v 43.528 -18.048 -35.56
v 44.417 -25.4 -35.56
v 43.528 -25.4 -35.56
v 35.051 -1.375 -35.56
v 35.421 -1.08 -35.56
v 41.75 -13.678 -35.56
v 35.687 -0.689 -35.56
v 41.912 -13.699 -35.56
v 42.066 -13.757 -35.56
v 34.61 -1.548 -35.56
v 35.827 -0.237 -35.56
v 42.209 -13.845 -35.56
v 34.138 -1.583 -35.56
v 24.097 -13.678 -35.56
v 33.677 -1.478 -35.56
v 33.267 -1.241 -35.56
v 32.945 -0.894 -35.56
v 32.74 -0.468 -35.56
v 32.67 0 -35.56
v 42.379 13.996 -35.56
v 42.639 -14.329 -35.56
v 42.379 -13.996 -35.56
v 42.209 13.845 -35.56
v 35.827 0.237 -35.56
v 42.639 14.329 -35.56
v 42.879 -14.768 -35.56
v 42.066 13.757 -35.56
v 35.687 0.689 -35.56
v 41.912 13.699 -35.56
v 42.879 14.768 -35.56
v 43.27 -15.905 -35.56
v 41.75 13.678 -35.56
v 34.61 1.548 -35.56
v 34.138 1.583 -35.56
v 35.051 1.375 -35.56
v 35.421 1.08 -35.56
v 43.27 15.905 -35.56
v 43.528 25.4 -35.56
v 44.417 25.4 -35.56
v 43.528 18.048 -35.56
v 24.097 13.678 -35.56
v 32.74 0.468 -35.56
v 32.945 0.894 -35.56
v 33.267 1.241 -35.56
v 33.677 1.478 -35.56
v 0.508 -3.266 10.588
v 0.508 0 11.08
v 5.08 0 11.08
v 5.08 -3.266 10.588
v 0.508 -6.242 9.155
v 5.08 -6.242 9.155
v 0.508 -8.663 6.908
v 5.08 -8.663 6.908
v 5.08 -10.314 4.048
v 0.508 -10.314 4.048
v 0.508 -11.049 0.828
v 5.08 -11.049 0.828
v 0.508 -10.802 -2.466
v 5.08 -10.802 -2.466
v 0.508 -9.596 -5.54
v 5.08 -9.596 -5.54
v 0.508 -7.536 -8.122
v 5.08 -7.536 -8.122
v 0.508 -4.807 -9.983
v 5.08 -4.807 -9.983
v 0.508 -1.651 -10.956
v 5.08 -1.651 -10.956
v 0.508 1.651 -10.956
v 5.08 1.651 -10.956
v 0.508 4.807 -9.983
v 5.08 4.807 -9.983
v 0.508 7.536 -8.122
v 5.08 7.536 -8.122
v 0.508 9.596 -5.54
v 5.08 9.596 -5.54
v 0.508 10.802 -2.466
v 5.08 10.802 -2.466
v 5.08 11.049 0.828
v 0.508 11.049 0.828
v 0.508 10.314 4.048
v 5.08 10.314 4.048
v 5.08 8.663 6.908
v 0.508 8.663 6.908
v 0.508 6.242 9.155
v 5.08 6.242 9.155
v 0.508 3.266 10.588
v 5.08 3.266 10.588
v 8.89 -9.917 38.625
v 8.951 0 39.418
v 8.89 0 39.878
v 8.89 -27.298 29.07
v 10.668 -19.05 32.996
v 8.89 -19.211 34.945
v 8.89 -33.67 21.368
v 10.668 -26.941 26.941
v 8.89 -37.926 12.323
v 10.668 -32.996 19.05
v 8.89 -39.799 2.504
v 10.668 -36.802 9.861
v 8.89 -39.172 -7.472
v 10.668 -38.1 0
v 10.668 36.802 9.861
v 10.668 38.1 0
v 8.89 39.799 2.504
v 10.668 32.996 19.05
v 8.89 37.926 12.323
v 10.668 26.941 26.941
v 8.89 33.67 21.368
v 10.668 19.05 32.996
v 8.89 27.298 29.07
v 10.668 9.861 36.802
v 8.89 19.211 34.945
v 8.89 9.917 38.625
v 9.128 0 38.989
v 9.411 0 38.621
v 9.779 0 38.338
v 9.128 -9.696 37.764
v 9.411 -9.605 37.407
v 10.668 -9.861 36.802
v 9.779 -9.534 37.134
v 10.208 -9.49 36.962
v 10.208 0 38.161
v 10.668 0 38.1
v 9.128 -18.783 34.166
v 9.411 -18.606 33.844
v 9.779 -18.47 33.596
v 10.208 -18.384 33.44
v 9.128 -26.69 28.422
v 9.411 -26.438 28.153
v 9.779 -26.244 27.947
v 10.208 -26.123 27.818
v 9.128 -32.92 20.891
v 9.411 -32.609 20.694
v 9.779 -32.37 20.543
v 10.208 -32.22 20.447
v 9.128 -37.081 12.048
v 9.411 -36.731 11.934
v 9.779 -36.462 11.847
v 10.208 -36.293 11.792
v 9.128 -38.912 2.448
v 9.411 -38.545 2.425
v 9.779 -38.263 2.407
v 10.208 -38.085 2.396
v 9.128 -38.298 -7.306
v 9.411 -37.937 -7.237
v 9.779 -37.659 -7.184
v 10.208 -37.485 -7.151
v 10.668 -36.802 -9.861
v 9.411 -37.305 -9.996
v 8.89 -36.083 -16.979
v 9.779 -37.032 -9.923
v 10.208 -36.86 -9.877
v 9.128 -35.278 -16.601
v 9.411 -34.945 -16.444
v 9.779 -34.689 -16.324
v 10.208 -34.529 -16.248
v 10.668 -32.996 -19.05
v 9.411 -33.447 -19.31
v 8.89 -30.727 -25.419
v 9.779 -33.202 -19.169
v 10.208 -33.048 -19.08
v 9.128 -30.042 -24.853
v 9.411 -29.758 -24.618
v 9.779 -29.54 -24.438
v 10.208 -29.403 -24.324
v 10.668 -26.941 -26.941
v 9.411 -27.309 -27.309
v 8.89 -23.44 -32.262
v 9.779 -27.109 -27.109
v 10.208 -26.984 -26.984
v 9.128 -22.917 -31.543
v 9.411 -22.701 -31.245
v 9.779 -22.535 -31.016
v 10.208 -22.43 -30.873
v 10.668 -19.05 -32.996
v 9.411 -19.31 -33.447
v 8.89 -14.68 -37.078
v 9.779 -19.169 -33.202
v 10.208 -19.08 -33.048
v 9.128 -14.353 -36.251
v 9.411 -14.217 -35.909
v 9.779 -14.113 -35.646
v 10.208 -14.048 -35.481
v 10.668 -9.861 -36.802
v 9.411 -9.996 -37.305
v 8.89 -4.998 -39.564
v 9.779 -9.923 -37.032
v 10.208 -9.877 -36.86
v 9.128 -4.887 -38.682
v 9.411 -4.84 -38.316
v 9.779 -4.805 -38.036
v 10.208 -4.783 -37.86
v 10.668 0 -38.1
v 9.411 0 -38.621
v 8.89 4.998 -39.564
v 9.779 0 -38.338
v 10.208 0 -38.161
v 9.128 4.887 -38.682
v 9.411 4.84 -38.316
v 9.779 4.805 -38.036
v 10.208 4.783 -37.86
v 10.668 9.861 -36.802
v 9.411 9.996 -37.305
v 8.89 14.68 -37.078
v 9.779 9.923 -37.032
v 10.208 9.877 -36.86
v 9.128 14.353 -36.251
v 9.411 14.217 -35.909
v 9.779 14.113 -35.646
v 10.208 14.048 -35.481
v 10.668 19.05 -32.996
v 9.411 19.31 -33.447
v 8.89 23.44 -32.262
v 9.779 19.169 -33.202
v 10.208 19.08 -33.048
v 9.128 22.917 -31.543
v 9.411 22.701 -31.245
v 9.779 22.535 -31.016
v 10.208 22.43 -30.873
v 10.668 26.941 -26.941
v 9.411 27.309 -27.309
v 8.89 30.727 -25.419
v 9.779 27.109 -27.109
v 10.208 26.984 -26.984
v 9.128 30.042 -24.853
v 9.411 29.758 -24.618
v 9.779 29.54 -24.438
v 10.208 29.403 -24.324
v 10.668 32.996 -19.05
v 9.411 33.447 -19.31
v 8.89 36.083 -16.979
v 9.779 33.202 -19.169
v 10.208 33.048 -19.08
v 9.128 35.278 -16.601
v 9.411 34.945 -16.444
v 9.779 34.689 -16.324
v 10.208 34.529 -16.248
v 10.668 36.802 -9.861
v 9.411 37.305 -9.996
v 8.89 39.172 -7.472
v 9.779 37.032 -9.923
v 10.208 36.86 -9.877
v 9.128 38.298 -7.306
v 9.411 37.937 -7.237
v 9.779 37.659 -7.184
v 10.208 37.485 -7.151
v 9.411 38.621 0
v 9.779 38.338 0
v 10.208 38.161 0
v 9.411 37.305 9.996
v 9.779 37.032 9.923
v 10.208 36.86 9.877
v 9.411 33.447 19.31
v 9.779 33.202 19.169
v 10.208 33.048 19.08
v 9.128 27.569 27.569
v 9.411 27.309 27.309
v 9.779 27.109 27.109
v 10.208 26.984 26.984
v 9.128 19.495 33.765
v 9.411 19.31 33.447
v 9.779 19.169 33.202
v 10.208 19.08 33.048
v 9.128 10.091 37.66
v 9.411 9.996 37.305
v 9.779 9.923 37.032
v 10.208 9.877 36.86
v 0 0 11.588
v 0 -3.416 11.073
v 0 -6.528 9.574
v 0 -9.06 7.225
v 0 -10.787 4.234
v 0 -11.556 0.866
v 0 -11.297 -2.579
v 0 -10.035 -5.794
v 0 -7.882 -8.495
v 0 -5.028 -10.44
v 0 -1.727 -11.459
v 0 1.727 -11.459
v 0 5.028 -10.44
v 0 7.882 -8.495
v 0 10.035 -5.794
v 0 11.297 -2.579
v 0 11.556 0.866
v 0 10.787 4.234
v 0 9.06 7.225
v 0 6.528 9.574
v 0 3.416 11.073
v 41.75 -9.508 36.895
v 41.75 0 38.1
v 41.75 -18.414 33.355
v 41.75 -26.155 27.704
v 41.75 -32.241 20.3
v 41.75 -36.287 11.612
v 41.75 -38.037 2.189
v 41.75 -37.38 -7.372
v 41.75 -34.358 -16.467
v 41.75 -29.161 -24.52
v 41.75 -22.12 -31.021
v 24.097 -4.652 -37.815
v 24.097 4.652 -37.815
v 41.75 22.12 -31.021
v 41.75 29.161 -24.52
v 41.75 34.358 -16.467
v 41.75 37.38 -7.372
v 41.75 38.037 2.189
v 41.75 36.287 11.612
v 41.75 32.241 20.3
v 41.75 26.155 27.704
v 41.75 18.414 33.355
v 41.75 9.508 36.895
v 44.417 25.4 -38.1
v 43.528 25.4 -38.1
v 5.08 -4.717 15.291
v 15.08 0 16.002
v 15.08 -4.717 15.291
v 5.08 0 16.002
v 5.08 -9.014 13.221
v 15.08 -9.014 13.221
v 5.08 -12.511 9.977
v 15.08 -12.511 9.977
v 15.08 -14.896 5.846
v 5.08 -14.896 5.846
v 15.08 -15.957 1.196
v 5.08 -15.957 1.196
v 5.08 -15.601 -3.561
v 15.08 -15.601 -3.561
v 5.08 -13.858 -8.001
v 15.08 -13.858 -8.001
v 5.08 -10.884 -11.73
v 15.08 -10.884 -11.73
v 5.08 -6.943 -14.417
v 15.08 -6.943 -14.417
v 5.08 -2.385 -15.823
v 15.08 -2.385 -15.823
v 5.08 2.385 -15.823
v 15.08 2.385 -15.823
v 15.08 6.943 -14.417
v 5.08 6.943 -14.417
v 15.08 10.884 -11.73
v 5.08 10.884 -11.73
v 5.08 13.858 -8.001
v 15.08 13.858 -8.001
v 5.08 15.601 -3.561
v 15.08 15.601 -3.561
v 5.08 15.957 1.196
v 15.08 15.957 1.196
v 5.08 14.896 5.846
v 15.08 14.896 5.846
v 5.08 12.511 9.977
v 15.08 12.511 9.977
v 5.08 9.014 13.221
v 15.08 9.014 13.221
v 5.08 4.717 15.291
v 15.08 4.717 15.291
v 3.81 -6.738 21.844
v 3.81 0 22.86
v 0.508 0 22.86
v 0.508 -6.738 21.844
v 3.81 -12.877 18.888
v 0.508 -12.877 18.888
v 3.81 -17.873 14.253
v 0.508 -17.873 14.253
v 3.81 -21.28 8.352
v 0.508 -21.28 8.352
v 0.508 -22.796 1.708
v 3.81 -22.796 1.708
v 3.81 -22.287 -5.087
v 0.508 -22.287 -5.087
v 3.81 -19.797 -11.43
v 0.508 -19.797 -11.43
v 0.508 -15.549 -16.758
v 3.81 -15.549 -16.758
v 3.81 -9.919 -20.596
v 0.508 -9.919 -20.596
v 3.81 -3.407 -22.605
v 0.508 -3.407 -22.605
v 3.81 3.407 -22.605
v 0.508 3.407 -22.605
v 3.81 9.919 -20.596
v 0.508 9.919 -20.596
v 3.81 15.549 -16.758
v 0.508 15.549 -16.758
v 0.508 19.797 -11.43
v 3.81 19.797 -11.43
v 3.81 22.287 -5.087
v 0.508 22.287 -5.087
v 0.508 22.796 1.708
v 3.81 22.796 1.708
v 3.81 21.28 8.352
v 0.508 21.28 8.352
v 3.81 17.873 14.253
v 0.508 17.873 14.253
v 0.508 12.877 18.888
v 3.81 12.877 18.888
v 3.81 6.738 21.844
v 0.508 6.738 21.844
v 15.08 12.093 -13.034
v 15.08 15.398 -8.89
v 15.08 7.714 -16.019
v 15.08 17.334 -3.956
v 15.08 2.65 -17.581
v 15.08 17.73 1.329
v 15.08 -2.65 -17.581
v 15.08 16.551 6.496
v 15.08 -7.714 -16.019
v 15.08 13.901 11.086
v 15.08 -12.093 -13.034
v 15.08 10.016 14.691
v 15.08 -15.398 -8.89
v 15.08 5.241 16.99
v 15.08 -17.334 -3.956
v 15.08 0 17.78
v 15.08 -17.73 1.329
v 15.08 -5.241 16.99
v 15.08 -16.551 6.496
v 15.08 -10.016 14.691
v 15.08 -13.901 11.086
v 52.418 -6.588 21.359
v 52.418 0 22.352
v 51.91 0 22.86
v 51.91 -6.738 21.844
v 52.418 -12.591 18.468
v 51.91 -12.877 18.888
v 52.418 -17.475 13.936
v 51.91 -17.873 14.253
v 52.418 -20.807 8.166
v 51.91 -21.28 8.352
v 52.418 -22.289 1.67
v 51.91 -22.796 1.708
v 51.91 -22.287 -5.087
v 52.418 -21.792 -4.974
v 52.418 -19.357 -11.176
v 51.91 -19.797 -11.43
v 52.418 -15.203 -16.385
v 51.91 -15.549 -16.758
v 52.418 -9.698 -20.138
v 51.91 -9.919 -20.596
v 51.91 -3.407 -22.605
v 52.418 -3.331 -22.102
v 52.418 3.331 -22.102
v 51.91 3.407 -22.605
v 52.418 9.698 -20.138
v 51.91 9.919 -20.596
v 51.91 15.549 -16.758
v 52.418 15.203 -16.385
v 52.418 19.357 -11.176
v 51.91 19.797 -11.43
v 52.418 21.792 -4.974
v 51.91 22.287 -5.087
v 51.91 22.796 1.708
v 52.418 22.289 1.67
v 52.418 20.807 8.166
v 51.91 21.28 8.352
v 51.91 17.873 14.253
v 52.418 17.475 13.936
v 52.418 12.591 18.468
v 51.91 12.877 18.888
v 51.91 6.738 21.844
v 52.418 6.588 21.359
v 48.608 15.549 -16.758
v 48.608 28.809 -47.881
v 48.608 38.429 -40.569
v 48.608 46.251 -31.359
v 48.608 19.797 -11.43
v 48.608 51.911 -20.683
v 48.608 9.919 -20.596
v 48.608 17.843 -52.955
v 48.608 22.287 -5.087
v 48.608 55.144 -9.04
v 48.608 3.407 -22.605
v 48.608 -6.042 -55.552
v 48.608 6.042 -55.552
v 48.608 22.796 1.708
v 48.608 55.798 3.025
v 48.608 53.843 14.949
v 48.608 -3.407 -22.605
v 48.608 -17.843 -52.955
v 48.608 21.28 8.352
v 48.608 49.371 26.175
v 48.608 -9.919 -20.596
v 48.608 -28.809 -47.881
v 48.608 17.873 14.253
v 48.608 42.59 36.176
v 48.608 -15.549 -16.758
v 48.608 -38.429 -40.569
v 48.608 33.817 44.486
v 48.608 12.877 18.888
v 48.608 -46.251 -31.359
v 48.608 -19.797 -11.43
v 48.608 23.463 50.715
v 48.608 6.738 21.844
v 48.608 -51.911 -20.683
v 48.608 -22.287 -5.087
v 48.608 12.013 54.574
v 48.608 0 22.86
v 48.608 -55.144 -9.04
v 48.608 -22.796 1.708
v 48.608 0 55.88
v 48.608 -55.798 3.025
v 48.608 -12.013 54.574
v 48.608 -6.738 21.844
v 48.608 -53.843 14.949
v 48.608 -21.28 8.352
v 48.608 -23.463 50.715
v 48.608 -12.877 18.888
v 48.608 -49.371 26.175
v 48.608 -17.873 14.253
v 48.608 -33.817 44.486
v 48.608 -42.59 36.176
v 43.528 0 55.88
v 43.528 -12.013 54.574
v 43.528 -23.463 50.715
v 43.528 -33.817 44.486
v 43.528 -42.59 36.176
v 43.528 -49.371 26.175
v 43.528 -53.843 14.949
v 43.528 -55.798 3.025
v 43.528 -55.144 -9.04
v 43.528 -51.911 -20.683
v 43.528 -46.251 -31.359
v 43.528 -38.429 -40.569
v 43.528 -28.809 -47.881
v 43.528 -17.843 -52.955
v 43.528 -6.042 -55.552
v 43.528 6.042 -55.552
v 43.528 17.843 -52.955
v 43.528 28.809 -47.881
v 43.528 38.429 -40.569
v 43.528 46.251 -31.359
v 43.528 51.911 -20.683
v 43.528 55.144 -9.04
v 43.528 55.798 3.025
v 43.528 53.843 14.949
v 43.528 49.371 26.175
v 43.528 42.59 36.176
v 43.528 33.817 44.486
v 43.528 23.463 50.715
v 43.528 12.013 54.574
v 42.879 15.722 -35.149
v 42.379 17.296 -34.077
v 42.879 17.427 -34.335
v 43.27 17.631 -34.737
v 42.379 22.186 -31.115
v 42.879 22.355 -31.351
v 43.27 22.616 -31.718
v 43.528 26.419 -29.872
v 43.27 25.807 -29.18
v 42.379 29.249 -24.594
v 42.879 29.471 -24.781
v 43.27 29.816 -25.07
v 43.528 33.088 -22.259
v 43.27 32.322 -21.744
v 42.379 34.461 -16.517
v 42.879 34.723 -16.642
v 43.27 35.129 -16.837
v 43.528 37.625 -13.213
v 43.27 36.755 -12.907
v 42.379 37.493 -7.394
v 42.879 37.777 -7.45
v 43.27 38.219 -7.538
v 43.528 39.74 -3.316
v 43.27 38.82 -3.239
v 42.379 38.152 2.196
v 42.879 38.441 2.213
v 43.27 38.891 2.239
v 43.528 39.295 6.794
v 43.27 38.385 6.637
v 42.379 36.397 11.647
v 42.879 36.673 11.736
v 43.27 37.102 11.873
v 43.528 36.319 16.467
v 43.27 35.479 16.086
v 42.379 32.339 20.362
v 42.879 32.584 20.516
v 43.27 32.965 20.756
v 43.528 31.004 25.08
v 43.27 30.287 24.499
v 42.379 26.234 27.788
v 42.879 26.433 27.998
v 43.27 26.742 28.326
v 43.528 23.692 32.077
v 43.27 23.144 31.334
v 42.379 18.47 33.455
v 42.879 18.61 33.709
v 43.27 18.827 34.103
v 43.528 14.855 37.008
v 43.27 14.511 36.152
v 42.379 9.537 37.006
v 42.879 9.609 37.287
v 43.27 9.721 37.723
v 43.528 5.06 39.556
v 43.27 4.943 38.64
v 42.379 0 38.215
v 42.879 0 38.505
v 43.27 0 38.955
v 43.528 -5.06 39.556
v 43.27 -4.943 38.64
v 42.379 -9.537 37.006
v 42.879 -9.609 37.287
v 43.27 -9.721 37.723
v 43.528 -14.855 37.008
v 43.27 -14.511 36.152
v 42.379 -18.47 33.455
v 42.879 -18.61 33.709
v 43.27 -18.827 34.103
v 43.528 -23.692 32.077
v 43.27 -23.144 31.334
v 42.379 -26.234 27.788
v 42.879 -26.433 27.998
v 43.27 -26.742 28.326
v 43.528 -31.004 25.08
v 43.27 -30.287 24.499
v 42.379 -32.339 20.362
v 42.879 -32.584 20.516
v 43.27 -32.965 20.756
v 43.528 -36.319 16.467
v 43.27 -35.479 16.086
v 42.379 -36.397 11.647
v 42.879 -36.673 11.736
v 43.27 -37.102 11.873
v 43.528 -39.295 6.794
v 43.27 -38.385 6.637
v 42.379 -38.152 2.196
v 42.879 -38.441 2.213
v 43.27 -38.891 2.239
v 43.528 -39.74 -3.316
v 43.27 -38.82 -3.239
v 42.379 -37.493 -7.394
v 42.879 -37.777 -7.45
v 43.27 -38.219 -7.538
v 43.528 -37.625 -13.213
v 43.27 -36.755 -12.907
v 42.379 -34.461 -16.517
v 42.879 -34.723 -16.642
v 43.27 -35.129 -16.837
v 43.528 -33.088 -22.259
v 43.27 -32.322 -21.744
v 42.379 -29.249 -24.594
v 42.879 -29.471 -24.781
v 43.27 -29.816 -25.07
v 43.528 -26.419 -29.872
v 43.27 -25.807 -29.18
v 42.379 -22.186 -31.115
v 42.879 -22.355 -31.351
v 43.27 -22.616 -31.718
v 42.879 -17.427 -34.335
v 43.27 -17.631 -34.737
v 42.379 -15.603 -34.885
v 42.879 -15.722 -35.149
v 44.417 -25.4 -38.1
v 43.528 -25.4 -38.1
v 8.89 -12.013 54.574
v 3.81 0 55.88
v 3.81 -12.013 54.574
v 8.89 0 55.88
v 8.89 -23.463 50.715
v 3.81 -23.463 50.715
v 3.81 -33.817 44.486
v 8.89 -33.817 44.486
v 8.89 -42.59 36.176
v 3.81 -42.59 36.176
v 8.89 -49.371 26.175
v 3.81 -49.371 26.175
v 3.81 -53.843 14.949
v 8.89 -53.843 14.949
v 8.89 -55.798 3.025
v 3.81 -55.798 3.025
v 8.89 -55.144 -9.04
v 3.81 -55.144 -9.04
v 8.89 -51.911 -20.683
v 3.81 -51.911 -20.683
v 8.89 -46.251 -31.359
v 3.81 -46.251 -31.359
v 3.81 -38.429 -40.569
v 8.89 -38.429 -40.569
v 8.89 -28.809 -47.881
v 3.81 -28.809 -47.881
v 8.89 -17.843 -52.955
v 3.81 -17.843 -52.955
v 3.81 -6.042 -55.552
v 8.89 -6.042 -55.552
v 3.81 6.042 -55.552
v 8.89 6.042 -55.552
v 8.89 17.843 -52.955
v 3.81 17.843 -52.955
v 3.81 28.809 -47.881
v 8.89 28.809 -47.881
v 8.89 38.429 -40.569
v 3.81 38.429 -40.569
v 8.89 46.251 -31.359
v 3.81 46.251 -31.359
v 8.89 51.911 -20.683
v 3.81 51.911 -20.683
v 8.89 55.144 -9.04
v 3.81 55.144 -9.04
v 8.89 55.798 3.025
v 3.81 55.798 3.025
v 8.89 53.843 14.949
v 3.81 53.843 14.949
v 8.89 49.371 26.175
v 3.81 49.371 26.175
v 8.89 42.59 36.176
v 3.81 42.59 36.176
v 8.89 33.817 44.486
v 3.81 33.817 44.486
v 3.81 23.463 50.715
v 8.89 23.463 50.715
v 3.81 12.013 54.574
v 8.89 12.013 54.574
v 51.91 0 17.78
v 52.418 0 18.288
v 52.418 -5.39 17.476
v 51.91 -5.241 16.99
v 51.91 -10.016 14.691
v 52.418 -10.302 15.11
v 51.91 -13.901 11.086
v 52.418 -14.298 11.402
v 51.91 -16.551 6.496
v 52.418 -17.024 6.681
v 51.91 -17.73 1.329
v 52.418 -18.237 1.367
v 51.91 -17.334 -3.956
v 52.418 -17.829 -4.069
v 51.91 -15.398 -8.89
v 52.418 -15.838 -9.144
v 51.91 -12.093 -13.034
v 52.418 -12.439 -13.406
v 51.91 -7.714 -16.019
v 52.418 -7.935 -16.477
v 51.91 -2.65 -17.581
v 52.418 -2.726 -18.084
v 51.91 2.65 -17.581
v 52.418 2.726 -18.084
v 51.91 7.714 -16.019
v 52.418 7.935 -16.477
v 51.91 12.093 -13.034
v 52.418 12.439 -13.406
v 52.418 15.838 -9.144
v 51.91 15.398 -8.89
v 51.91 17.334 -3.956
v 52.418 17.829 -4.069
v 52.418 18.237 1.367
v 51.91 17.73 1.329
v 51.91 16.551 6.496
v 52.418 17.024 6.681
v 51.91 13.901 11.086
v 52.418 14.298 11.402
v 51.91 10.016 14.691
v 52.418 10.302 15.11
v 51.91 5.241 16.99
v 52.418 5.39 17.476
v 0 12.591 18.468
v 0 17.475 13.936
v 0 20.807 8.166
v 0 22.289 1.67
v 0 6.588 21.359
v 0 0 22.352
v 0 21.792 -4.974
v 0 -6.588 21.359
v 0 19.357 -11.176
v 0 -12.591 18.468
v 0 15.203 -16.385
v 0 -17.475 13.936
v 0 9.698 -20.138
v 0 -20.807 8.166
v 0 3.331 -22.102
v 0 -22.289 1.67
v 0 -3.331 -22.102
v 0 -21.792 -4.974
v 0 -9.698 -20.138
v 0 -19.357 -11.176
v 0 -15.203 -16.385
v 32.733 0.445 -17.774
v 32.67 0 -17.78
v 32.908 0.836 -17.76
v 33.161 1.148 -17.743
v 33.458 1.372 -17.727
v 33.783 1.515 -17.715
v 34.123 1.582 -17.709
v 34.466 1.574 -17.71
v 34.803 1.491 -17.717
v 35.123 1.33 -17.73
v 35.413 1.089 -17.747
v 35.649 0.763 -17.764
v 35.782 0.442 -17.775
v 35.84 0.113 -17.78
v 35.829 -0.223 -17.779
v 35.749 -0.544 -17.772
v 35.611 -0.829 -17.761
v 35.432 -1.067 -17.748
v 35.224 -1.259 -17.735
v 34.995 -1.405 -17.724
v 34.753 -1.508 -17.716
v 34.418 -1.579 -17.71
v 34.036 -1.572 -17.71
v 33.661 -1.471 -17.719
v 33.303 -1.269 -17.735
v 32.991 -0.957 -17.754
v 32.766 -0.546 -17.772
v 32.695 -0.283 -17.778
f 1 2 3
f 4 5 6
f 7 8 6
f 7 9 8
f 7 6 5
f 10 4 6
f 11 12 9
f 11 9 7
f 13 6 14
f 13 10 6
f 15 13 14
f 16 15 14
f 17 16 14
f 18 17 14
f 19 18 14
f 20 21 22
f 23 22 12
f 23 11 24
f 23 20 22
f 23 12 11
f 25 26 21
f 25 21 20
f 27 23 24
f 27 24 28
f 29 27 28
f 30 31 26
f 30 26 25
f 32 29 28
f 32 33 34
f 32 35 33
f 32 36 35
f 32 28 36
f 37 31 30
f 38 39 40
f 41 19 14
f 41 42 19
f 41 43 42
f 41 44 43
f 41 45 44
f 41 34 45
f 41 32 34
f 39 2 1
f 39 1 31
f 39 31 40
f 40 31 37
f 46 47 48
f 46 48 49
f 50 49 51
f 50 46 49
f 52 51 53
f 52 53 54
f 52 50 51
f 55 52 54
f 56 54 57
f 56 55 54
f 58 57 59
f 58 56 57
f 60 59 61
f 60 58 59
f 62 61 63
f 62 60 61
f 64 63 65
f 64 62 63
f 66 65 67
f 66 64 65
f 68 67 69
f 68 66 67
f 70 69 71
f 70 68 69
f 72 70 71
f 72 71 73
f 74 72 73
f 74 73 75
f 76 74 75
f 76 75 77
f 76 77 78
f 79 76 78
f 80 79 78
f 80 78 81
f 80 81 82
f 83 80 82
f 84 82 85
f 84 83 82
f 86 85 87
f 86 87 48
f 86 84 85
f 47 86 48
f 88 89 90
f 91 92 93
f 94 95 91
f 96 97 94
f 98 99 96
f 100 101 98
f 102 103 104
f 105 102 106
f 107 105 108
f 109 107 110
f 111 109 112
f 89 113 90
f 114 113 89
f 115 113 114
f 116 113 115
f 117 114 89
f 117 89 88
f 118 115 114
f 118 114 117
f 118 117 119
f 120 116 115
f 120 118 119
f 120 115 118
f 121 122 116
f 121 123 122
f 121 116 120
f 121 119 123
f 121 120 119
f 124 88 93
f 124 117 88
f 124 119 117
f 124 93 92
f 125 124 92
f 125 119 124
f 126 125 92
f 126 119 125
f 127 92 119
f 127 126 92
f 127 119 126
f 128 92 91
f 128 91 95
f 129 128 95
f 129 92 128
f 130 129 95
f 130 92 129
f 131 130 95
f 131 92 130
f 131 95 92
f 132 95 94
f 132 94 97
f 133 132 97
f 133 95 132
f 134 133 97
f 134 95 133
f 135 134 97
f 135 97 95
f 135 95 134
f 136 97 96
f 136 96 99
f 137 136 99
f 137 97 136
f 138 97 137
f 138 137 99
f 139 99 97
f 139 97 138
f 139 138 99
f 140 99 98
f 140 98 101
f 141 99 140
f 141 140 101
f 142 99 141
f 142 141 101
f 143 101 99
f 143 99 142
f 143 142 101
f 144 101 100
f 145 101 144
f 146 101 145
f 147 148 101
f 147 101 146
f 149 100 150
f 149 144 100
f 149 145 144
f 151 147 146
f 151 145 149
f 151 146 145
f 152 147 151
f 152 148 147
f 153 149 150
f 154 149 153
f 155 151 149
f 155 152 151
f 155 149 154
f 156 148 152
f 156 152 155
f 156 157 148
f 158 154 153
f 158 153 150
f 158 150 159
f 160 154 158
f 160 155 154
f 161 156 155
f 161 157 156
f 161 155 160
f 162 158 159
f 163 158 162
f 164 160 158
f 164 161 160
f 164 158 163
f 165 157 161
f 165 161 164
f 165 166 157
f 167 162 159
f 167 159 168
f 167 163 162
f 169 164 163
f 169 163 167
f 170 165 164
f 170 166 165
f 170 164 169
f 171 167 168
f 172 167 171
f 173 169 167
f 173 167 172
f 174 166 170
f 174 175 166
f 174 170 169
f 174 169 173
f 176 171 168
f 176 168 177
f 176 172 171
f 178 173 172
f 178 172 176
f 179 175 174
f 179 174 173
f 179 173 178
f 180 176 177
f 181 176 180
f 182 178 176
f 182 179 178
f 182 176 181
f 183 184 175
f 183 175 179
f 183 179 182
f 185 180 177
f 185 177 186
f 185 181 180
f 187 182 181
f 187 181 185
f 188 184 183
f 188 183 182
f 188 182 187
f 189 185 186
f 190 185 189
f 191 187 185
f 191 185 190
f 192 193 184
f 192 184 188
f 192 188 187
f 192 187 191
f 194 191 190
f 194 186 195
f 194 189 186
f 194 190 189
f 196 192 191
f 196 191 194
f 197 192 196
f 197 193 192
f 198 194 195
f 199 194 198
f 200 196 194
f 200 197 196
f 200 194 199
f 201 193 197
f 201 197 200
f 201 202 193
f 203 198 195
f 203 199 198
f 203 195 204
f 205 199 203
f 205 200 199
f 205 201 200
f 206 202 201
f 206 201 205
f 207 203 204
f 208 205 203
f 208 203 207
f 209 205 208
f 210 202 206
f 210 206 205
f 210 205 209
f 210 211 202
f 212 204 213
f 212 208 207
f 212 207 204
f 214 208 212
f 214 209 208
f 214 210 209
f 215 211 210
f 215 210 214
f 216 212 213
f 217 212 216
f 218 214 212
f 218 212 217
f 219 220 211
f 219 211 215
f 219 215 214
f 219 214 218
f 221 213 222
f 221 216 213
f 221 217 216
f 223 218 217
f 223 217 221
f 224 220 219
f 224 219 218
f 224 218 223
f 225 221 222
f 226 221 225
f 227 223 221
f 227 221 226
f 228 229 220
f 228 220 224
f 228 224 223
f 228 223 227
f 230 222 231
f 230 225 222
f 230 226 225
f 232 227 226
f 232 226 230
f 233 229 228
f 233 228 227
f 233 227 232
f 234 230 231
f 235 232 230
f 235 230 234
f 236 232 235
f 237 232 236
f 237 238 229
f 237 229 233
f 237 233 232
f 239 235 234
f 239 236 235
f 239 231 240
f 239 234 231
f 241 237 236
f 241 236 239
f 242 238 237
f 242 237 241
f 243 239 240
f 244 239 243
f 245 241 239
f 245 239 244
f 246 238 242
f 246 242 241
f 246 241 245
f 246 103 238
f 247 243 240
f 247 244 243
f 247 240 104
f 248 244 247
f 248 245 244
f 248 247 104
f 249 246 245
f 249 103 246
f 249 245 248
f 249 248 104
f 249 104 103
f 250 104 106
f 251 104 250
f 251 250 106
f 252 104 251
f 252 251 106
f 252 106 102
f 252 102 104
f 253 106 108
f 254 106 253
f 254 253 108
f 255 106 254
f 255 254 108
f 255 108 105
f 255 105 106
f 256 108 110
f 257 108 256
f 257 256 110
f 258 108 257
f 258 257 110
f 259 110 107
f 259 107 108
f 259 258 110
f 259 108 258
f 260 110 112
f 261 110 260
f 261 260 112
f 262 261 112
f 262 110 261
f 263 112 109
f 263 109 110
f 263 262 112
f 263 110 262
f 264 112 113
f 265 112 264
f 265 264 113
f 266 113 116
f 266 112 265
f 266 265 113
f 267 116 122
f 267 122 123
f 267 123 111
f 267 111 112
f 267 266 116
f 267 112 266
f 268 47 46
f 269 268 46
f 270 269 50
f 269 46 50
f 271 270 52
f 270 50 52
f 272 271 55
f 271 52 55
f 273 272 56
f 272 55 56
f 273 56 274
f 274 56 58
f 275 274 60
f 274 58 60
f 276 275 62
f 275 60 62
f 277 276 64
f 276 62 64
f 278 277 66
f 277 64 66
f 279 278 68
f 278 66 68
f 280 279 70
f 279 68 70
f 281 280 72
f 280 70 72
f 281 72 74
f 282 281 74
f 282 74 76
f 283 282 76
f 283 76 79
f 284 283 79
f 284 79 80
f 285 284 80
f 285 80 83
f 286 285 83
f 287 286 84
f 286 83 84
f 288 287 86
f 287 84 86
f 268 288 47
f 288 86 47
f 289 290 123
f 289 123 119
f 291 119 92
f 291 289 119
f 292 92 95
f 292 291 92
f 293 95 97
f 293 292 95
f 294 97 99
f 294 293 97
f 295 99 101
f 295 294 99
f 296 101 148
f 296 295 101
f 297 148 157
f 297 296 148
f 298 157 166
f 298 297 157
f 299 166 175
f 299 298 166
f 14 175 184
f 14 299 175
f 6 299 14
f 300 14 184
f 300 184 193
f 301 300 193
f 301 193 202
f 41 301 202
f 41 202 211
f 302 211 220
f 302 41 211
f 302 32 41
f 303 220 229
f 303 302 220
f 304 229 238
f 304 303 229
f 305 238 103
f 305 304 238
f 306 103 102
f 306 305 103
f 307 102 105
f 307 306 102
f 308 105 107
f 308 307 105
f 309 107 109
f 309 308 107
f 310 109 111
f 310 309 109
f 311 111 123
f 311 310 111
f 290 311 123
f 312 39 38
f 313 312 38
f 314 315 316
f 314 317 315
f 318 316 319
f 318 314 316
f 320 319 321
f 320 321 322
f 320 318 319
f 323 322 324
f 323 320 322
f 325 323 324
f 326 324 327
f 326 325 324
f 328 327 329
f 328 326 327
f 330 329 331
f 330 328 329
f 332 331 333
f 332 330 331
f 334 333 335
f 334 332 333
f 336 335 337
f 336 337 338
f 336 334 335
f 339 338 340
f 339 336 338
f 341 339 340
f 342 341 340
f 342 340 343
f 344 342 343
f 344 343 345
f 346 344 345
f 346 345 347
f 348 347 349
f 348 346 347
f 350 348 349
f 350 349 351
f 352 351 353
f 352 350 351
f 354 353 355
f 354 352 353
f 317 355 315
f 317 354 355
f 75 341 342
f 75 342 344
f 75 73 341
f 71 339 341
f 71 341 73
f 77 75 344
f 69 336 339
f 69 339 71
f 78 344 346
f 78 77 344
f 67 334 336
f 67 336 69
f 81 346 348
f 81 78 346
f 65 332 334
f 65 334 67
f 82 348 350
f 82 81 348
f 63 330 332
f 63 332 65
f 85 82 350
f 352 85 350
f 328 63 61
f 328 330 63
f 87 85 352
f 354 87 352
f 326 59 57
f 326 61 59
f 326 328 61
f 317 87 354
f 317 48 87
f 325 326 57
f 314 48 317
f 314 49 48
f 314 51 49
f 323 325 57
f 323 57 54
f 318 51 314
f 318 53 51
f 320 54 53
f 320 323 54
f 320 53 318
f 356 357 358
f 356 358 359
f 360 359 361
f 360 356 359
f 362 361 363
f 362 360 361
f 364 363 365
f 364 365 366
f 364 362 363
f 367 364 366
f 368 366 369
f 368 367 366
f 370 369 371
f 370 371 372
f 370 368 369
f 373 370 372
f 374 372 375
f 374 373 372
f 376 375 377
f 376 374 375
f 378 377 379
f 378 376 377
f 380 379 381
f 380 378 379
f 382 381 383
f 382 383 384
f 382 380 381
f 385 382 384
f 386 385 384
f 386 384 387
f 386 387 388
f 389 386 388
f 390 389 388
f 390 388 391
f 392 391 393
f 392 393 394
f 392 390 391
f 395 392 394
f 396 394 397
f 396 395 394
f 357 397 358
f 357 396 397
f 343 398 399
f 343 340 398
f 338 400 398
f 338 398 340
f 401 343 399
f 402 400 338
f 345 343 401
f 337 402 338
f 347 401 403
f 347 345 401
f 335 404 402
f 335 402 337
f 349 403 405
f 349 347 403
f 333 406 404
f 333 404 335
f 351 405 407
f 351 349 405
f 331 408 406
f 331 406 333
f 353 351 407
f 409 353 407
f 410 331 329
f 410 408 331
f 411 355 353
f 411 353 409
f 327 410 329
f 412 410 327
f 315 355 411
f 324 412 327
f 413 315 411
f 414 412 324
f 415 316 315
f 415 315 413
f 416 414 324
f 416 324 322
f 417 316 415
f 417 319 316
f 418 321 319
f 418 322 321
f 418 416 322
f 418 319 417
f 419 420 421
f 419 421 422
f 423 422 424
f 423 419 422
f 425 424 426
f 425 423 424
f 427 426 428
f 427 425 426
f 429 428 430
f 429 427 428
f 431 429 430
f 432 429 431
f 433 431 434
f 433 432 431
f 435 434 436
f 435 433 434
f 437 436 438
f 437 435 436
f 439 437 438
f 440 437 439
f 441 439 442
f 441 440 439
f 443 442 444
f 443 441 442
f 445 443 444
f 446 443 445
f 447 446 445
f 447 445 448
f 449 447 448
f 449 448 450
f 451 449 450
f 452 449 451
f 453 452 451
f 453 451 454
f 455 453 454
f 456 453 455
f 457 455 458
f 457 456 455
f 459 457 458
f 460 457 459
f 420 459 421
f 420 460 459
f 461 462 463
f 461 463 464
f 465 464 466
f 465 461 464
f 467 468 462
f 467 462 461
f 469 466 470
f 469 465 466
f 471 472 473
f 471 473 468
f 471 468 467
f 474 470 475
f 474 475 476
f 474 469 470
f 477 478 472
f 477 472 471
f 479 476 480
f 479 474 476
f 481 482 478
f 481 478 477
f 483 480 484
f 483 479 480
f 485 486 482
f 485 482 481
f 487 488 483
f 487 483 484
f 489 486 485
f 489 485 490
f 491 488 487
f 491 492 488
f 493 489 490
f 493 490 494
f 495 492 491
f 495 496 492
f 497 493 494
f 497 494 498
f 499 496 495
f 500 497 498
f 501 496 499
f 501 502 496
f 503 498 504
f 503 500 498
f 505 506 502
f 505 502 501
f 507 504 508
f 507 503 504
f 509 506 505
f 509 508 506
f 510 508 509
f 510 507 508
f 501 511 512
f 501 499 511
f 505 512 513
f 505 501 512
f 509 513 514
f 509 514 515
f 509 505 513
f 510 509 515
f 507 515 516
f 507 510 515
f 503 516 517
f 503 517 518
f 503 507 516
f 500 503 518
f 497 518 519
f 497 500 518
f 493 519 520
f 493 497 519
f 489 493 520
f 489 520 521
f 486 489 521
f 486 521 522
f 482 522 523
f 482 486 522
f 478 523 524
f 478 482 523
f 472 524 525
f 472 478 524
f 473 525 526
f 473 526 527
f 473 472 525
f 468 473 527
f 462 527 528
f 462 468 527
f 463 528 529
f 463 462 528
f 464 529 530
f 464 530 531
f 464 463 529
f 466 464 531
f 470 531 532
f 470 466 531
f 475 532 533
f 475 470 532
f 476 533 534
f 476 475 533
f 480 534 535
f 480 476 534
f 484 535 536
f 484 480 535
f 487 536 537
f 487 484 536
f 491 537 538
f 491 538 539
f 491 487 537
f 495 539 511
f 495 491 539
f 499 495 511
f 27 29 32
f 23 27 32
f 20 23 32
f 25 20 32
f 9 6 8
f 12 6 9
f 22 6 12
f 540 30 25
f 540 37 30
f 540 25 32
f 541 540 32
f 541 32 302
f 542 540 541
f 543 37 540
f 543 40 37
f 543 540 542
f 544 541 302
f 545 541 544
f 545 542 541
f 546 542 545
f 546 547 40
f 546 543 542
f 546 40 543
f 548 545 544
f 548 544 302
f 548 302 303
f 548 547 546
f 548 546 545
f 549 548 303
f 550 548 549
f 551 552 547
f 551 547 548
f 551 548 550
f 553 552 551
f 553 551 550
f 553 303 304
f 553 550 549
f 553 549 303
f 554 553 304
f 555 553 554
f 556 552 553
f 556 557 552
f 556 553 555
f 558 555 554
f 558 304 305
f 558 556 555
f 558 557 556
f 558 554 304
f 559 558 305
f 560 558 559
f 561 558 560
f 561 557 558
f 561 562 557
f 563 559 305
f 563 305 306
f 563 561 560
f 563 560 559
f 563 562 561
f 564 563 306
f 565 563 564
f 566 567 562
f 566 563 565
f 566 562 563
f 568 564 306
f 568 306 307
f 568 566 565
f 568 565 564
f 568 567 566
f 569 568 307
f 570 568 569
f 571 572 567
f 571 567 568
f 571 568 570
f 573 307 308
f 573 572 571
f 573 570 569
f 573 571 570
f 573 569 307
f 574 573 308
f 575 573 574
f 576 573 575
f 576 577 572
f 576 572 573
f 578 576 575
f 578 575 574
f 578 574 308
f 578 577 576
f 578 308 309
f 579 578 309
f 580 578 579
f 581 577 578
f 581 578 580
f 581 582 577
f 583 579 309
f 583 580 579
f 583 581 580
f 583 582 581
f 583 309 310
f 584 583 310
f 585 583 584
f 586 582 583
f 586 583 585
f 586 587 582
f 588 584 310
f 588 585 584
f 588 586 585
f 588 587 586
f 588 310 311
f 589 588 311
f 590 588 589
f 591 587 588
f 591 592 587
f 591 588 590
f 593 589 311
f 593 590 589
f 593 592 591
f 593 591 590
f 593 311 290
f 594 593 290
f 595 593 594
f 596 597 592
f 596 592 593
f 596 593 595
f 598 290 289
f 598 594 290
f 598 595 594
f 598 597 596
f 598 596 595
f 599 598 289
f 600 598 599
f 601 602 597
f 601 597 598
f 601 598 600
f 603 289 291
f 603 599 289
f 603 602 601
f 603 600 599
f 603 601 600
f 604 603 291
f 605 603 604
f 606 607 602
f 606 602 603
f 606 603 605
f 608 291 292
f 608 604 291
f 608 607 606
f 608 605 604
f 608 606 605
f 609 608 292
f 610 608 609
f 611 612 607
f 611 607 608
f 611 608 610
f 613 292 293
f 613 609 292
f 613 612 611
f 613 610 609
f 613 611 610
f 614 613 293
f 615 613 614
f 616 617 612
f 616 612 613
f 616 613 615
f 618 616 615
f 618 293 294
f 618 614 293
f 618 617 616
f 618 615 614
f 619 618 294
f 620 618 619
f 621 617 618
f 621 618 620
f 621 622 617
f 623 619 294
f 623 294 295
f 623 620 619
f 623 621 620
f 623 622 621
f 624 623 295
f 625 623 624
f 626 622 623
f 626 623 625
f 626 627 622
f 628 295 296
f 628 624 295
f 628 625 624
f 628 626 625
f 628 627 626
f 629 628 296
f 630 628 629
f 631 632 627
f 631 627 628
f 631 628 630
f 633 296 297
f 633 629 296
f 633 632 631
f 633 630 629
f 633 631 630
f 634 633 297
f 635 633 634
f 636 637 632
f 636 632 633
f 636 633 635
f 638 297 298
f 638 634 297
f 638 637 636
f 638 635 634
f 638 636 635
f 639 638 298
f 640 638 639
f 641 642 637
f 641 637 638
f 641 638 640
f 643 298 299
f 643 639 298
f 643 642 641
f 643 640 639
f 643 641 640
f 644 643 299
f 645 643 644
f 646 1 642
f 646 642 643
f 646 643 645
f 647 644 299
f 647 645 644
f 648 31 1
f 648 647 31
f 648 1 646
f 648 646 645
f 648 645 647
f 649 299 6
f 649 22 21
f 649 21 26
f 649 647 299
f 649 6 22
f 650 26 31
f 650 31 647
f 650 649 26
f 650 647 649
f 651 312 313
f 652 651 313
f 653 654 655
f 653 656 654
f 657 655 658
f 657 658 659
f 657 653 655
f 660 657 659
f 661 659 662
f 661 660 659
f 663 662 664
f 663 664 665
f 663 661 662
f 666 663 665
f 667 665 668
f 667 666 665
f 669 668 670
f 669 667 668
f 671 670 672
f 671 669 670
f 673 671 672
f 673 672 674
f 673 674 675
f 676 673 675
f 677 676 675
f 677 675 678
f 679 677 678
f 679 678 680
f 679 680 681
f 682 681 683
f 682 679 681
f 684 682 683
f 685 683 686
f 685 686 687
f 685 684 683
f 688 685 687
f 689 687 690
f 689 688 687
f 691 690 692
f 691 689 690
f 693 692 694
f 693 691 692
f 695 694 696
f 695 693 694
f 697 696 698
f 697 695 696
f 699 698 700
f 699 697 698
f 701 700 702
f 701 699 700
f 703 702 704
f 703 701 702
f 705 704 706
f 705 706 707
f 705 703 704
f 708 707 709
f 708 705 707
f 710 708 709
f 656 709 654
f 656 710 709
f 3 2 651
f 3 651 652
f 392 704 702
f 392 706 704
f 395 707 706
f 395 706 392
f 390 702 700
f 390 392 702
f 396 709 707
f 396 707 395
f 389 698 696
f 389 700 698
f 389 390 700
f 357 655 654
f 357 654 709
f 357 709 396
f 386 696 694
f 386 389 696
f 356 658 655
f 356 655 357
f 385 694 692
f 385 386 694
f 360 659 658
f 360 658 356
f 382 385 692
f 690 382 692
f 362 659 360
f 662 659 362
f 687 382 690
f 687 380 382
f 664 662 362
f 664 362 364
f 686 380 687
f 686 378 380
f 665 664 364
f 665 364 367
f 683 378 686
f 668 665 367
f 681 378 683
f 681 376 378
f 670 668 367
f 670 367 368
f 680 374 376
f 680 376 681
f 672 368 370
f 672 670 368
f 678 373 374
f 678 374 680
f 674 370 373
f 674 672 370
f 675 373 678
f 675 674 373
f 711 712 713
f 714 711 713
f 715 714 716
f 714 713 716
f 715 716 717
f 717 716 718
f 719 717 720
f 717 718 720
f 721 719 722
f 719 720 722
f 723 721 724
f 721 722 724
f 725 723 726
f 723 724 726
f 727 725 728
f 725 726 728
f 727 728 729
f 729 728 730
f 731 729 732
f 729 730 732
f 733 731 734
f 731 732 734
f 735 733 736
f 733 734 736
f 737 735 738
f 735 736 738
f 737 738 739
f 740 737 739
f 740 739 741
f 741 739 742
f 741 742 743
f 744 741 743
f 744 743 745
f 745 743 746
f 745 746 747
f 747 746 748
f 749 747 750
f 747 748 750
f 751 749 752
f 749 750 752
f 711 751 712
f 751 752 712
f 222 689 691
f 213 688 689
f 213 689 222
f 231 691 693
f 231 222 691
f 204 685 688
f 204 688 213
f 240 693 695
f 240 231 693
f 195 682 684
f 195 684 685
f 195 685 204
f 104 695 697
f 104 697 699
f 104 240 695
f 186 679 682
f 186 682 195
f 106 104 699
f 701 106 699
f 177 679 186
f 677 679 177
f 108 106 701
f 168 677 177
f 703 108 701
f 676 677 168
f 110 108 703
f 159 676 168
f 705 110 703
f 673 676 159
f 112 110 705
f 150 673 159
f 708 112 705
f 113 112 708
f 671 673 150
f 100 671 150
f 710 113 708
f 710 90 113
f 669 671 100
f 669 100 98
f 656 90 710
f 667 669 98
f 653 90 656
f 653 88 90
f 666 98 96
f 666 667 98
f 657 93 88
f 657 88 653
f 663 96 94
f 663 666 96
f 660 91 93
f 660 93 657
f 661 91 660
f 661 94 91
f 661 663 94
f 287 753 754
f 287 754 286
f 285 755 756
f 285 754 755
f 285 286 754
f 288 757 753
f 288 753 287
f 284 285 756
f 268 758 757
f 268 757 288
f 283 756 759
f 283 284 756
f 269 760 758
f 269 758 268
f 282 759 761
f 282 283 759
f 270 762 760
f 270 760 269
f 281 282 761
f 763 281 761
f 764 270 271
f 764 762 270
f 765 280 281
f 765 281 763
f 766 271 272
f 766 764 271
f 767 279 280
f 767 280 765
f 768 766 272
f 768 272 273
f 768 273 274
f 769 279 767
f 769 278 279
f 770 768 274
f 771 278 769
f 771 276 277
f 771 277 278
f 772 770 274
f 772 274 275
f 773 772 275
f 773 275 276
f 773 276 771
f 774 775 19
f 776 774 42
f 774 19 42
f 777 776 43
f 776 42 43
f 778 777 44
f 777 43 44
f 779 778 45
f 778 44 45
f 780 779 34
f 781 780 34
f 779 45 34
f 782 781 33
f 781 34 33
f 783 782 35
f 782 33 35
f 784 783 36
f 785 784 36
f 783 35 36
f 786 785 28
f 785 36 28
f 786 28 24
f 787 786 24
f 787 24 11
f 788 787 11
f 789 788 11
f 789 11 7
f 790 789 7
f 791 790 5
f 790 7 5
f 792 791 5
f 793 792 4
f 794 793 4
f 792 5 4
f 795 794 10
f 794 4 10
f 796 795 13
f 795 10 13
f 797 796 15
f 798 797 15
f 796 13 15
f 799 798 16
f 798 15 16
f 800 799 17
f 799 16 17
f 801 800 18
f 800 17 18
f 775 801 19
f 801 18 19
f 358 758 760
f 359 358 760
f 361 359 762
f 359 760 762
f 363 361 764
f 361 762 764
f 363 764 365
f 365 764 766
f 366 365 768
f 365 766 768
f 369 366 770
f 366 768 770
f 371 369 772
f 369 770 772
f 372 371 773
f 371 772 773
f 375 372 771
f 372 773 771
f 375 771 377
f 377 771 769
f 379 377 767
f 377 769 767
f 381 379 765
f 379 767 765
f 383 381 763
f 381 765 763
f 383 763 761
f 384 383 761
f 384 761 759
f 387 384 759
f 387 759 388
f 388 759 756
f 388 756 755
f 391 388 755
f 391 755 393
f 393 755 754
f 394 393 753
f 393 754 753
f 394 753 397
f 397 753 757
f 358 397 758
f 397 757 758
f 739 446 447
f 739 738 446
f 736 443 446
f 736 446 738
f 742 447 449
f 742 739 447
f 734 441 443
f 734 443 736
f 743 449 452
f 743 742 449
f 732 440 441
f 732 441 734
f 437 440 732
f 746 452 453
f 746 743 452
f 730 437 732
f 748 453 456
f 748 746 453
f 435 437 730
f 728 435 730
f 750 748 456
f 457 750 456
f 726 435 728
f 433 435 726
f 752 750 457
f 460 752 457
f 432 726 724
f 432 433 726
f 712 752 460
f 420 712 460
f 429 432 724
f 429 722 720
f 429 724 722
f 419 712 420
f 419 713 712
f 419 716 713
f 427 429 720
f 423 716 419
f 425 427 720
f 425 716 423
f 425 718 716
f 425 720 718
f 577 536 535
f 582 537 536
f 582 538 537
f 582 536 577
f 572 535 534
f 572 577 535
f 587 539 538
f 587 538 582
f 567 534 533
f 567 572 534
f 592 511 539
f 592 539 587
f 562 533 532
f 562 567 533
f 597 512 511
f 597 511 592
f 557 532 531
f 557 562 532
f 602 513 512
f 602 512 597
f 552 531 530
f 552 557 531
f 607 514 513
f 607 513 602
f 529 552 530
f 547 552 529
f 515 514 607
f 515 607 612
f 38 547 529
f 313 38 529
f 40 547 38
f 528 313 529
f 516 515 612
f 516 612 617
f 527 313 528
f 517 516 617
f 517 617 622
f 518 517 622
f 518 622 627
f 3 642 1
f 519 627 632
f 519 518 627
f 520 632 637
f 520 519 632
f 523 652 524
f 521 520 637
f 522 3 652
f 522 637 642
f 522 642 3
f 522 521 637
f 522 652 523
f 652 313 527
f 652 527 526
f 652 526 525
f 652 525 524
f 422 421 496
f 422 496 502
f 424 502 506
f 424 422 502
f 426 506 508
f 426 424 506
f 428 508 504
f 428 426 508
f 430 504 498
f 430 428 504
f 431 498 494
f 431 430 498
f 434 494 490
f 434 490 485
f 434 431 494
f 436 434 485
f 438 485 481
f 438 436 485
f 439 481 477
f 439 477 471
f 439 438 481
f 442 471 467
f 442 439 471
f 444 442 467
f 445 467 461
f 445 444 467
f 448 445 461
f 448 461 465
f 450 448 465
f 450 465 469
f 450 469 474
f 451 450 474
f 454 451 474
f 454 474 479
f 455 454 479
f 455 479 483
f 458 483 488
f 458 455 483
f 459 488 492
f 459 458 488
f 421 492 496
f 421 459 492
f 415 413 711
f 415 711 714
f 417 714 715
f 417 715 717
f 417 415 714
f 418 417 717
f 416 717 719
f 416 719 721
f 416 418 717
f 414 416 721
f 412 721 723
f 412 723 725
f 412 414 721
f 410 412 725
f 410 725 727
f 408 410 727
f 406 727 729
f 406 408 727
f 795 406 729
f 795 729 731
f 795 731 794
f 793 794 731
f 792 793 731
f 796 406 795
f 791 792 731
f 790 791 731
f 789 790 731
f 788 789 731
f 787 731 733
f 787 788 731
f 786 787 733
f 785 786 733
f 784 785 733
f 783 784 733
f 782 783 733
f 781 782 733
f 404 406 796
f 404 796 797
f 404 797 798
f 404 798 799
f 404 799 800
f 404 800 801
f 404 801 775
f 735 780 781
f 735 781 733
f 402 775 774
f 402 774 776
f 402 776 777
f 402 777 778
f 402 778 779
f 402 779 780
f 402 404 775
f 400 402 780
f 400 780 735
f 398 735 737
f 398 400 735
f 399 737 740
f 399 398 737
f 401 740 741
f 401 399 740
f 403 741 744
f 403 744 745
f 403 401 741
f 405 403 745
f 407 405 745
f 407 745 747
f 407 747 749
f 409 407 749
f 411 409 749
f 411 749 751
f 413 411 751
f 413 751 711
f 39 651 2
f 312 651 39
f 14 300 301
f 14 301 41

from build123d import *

# Parameters (mm, degrees)
SKETCH3_W                         = 20.32
SKETCH3_H                         = 50.8
CUT_EXTRUDE1_DEPTH                = 2.54
F_1_8_0_125_DIAMETER_HOLE1_REACH  = 123.254
F_1_8_0_125_DIAMETER_HOLE1_BORE_R = 1.5875
FILLET2_R                         = 1.778
CHAMFER1_SIZE                     = 0.508


with BuildPart() as part:
    # Sketch1 → Revolve1 (revolve)
    with BuildSketch(Plane.XY, mode=Mode.PRIVATE) as revolve1_sk:
        Polygon((3.81, 55.88), (8.89, 55.88), (8.89, 38.1), (43.5280054, 38.1), (43.5280054, 55.88), (48.6080054, 55.88), (48.6080054, 22.86), (52.4180054, 22.86), (52.4180054, 17.78), (15.0800054, 17.78), (15.0800054, 16.002), (5.08, 16.002), (5.08, 11.079988), (0, 11.079988), (0, 22.86), (3.81, 22.86), align=None)
    revolve(revolve1_sk.sketch.rotate(Axis((0, 0, 0), (1, 0, 0)), 90), axis=Axis((0, 0, 0), (1, 0, 0)))

    # Sketch3 → Cut-Extrude1 (cut)
    with BuildSketch(Plane(origin=(0, 0, -38.1), x_dir=(-1, 0, 0), z_dir=(0, 0, -1))):
        with Locations((-34.2570054, 0)):
            Rectangle(SKETCH3_W, SKETCH3_H)
    extrude(amount=-CUT_EXTRUDE1_DEPTH, mode=Mode.SUBTRACT)

    # 1/8 (0.125) Diameter Hole1 bore → 1/8 (0.125) Diameter Hole1 (cut, up to next)
    with BuildSketch(Plane(origin=(0, 0, -38.1), x_dir=(-1, 0, 0), z_dir=(0, 0, -1)), mode=Mode.PRIVATE) as f_1_8_0_125_diameter_hole1_sk1:
        with Locations((-34.2570054, 0)):
            Circle(F_1_8_0_125_DIAMETER_HOLE1_BORE_R)
    f_1_8_0_125_diameter_hole1_tool1 = extrude(f_1_8_0_125_diameter_hole1_sk1.sketch, amount=-F_1_8_0_125_DIAMETER_HOLE1_REACH, mode=Mode.PRIVATE) & part.part
    add(f_1_8_0_125_diameter_hole1_tool1.solids().sort_by_distance((34.257005, 0, -38.1))[0], mode=Mode.SUBTRACT)

    # Fillet2
    fillet2_edges = [part.edges().sort_by_distance(p)[0] for p in [
        (8.89, 0, -38.1),
        (43.5280054, 37.459618258, 6.95607648),
    ]]
    fillet(fillet2_edges, radius=FILLET2_R)

    # Chamfer1
    chamfer1_edges = [part.edges().sort_by_distance(p)[0] for p in [
        (0, 0, -22.86),
        (0, 0, -11.079988),
        (52.4180054, 0, -17.78),
        (52.4180054, 0, -22.86),
    ]]
    chamfer(chamfer1_edges, length=CHAMFER1_SIZE)


solid = part.part
